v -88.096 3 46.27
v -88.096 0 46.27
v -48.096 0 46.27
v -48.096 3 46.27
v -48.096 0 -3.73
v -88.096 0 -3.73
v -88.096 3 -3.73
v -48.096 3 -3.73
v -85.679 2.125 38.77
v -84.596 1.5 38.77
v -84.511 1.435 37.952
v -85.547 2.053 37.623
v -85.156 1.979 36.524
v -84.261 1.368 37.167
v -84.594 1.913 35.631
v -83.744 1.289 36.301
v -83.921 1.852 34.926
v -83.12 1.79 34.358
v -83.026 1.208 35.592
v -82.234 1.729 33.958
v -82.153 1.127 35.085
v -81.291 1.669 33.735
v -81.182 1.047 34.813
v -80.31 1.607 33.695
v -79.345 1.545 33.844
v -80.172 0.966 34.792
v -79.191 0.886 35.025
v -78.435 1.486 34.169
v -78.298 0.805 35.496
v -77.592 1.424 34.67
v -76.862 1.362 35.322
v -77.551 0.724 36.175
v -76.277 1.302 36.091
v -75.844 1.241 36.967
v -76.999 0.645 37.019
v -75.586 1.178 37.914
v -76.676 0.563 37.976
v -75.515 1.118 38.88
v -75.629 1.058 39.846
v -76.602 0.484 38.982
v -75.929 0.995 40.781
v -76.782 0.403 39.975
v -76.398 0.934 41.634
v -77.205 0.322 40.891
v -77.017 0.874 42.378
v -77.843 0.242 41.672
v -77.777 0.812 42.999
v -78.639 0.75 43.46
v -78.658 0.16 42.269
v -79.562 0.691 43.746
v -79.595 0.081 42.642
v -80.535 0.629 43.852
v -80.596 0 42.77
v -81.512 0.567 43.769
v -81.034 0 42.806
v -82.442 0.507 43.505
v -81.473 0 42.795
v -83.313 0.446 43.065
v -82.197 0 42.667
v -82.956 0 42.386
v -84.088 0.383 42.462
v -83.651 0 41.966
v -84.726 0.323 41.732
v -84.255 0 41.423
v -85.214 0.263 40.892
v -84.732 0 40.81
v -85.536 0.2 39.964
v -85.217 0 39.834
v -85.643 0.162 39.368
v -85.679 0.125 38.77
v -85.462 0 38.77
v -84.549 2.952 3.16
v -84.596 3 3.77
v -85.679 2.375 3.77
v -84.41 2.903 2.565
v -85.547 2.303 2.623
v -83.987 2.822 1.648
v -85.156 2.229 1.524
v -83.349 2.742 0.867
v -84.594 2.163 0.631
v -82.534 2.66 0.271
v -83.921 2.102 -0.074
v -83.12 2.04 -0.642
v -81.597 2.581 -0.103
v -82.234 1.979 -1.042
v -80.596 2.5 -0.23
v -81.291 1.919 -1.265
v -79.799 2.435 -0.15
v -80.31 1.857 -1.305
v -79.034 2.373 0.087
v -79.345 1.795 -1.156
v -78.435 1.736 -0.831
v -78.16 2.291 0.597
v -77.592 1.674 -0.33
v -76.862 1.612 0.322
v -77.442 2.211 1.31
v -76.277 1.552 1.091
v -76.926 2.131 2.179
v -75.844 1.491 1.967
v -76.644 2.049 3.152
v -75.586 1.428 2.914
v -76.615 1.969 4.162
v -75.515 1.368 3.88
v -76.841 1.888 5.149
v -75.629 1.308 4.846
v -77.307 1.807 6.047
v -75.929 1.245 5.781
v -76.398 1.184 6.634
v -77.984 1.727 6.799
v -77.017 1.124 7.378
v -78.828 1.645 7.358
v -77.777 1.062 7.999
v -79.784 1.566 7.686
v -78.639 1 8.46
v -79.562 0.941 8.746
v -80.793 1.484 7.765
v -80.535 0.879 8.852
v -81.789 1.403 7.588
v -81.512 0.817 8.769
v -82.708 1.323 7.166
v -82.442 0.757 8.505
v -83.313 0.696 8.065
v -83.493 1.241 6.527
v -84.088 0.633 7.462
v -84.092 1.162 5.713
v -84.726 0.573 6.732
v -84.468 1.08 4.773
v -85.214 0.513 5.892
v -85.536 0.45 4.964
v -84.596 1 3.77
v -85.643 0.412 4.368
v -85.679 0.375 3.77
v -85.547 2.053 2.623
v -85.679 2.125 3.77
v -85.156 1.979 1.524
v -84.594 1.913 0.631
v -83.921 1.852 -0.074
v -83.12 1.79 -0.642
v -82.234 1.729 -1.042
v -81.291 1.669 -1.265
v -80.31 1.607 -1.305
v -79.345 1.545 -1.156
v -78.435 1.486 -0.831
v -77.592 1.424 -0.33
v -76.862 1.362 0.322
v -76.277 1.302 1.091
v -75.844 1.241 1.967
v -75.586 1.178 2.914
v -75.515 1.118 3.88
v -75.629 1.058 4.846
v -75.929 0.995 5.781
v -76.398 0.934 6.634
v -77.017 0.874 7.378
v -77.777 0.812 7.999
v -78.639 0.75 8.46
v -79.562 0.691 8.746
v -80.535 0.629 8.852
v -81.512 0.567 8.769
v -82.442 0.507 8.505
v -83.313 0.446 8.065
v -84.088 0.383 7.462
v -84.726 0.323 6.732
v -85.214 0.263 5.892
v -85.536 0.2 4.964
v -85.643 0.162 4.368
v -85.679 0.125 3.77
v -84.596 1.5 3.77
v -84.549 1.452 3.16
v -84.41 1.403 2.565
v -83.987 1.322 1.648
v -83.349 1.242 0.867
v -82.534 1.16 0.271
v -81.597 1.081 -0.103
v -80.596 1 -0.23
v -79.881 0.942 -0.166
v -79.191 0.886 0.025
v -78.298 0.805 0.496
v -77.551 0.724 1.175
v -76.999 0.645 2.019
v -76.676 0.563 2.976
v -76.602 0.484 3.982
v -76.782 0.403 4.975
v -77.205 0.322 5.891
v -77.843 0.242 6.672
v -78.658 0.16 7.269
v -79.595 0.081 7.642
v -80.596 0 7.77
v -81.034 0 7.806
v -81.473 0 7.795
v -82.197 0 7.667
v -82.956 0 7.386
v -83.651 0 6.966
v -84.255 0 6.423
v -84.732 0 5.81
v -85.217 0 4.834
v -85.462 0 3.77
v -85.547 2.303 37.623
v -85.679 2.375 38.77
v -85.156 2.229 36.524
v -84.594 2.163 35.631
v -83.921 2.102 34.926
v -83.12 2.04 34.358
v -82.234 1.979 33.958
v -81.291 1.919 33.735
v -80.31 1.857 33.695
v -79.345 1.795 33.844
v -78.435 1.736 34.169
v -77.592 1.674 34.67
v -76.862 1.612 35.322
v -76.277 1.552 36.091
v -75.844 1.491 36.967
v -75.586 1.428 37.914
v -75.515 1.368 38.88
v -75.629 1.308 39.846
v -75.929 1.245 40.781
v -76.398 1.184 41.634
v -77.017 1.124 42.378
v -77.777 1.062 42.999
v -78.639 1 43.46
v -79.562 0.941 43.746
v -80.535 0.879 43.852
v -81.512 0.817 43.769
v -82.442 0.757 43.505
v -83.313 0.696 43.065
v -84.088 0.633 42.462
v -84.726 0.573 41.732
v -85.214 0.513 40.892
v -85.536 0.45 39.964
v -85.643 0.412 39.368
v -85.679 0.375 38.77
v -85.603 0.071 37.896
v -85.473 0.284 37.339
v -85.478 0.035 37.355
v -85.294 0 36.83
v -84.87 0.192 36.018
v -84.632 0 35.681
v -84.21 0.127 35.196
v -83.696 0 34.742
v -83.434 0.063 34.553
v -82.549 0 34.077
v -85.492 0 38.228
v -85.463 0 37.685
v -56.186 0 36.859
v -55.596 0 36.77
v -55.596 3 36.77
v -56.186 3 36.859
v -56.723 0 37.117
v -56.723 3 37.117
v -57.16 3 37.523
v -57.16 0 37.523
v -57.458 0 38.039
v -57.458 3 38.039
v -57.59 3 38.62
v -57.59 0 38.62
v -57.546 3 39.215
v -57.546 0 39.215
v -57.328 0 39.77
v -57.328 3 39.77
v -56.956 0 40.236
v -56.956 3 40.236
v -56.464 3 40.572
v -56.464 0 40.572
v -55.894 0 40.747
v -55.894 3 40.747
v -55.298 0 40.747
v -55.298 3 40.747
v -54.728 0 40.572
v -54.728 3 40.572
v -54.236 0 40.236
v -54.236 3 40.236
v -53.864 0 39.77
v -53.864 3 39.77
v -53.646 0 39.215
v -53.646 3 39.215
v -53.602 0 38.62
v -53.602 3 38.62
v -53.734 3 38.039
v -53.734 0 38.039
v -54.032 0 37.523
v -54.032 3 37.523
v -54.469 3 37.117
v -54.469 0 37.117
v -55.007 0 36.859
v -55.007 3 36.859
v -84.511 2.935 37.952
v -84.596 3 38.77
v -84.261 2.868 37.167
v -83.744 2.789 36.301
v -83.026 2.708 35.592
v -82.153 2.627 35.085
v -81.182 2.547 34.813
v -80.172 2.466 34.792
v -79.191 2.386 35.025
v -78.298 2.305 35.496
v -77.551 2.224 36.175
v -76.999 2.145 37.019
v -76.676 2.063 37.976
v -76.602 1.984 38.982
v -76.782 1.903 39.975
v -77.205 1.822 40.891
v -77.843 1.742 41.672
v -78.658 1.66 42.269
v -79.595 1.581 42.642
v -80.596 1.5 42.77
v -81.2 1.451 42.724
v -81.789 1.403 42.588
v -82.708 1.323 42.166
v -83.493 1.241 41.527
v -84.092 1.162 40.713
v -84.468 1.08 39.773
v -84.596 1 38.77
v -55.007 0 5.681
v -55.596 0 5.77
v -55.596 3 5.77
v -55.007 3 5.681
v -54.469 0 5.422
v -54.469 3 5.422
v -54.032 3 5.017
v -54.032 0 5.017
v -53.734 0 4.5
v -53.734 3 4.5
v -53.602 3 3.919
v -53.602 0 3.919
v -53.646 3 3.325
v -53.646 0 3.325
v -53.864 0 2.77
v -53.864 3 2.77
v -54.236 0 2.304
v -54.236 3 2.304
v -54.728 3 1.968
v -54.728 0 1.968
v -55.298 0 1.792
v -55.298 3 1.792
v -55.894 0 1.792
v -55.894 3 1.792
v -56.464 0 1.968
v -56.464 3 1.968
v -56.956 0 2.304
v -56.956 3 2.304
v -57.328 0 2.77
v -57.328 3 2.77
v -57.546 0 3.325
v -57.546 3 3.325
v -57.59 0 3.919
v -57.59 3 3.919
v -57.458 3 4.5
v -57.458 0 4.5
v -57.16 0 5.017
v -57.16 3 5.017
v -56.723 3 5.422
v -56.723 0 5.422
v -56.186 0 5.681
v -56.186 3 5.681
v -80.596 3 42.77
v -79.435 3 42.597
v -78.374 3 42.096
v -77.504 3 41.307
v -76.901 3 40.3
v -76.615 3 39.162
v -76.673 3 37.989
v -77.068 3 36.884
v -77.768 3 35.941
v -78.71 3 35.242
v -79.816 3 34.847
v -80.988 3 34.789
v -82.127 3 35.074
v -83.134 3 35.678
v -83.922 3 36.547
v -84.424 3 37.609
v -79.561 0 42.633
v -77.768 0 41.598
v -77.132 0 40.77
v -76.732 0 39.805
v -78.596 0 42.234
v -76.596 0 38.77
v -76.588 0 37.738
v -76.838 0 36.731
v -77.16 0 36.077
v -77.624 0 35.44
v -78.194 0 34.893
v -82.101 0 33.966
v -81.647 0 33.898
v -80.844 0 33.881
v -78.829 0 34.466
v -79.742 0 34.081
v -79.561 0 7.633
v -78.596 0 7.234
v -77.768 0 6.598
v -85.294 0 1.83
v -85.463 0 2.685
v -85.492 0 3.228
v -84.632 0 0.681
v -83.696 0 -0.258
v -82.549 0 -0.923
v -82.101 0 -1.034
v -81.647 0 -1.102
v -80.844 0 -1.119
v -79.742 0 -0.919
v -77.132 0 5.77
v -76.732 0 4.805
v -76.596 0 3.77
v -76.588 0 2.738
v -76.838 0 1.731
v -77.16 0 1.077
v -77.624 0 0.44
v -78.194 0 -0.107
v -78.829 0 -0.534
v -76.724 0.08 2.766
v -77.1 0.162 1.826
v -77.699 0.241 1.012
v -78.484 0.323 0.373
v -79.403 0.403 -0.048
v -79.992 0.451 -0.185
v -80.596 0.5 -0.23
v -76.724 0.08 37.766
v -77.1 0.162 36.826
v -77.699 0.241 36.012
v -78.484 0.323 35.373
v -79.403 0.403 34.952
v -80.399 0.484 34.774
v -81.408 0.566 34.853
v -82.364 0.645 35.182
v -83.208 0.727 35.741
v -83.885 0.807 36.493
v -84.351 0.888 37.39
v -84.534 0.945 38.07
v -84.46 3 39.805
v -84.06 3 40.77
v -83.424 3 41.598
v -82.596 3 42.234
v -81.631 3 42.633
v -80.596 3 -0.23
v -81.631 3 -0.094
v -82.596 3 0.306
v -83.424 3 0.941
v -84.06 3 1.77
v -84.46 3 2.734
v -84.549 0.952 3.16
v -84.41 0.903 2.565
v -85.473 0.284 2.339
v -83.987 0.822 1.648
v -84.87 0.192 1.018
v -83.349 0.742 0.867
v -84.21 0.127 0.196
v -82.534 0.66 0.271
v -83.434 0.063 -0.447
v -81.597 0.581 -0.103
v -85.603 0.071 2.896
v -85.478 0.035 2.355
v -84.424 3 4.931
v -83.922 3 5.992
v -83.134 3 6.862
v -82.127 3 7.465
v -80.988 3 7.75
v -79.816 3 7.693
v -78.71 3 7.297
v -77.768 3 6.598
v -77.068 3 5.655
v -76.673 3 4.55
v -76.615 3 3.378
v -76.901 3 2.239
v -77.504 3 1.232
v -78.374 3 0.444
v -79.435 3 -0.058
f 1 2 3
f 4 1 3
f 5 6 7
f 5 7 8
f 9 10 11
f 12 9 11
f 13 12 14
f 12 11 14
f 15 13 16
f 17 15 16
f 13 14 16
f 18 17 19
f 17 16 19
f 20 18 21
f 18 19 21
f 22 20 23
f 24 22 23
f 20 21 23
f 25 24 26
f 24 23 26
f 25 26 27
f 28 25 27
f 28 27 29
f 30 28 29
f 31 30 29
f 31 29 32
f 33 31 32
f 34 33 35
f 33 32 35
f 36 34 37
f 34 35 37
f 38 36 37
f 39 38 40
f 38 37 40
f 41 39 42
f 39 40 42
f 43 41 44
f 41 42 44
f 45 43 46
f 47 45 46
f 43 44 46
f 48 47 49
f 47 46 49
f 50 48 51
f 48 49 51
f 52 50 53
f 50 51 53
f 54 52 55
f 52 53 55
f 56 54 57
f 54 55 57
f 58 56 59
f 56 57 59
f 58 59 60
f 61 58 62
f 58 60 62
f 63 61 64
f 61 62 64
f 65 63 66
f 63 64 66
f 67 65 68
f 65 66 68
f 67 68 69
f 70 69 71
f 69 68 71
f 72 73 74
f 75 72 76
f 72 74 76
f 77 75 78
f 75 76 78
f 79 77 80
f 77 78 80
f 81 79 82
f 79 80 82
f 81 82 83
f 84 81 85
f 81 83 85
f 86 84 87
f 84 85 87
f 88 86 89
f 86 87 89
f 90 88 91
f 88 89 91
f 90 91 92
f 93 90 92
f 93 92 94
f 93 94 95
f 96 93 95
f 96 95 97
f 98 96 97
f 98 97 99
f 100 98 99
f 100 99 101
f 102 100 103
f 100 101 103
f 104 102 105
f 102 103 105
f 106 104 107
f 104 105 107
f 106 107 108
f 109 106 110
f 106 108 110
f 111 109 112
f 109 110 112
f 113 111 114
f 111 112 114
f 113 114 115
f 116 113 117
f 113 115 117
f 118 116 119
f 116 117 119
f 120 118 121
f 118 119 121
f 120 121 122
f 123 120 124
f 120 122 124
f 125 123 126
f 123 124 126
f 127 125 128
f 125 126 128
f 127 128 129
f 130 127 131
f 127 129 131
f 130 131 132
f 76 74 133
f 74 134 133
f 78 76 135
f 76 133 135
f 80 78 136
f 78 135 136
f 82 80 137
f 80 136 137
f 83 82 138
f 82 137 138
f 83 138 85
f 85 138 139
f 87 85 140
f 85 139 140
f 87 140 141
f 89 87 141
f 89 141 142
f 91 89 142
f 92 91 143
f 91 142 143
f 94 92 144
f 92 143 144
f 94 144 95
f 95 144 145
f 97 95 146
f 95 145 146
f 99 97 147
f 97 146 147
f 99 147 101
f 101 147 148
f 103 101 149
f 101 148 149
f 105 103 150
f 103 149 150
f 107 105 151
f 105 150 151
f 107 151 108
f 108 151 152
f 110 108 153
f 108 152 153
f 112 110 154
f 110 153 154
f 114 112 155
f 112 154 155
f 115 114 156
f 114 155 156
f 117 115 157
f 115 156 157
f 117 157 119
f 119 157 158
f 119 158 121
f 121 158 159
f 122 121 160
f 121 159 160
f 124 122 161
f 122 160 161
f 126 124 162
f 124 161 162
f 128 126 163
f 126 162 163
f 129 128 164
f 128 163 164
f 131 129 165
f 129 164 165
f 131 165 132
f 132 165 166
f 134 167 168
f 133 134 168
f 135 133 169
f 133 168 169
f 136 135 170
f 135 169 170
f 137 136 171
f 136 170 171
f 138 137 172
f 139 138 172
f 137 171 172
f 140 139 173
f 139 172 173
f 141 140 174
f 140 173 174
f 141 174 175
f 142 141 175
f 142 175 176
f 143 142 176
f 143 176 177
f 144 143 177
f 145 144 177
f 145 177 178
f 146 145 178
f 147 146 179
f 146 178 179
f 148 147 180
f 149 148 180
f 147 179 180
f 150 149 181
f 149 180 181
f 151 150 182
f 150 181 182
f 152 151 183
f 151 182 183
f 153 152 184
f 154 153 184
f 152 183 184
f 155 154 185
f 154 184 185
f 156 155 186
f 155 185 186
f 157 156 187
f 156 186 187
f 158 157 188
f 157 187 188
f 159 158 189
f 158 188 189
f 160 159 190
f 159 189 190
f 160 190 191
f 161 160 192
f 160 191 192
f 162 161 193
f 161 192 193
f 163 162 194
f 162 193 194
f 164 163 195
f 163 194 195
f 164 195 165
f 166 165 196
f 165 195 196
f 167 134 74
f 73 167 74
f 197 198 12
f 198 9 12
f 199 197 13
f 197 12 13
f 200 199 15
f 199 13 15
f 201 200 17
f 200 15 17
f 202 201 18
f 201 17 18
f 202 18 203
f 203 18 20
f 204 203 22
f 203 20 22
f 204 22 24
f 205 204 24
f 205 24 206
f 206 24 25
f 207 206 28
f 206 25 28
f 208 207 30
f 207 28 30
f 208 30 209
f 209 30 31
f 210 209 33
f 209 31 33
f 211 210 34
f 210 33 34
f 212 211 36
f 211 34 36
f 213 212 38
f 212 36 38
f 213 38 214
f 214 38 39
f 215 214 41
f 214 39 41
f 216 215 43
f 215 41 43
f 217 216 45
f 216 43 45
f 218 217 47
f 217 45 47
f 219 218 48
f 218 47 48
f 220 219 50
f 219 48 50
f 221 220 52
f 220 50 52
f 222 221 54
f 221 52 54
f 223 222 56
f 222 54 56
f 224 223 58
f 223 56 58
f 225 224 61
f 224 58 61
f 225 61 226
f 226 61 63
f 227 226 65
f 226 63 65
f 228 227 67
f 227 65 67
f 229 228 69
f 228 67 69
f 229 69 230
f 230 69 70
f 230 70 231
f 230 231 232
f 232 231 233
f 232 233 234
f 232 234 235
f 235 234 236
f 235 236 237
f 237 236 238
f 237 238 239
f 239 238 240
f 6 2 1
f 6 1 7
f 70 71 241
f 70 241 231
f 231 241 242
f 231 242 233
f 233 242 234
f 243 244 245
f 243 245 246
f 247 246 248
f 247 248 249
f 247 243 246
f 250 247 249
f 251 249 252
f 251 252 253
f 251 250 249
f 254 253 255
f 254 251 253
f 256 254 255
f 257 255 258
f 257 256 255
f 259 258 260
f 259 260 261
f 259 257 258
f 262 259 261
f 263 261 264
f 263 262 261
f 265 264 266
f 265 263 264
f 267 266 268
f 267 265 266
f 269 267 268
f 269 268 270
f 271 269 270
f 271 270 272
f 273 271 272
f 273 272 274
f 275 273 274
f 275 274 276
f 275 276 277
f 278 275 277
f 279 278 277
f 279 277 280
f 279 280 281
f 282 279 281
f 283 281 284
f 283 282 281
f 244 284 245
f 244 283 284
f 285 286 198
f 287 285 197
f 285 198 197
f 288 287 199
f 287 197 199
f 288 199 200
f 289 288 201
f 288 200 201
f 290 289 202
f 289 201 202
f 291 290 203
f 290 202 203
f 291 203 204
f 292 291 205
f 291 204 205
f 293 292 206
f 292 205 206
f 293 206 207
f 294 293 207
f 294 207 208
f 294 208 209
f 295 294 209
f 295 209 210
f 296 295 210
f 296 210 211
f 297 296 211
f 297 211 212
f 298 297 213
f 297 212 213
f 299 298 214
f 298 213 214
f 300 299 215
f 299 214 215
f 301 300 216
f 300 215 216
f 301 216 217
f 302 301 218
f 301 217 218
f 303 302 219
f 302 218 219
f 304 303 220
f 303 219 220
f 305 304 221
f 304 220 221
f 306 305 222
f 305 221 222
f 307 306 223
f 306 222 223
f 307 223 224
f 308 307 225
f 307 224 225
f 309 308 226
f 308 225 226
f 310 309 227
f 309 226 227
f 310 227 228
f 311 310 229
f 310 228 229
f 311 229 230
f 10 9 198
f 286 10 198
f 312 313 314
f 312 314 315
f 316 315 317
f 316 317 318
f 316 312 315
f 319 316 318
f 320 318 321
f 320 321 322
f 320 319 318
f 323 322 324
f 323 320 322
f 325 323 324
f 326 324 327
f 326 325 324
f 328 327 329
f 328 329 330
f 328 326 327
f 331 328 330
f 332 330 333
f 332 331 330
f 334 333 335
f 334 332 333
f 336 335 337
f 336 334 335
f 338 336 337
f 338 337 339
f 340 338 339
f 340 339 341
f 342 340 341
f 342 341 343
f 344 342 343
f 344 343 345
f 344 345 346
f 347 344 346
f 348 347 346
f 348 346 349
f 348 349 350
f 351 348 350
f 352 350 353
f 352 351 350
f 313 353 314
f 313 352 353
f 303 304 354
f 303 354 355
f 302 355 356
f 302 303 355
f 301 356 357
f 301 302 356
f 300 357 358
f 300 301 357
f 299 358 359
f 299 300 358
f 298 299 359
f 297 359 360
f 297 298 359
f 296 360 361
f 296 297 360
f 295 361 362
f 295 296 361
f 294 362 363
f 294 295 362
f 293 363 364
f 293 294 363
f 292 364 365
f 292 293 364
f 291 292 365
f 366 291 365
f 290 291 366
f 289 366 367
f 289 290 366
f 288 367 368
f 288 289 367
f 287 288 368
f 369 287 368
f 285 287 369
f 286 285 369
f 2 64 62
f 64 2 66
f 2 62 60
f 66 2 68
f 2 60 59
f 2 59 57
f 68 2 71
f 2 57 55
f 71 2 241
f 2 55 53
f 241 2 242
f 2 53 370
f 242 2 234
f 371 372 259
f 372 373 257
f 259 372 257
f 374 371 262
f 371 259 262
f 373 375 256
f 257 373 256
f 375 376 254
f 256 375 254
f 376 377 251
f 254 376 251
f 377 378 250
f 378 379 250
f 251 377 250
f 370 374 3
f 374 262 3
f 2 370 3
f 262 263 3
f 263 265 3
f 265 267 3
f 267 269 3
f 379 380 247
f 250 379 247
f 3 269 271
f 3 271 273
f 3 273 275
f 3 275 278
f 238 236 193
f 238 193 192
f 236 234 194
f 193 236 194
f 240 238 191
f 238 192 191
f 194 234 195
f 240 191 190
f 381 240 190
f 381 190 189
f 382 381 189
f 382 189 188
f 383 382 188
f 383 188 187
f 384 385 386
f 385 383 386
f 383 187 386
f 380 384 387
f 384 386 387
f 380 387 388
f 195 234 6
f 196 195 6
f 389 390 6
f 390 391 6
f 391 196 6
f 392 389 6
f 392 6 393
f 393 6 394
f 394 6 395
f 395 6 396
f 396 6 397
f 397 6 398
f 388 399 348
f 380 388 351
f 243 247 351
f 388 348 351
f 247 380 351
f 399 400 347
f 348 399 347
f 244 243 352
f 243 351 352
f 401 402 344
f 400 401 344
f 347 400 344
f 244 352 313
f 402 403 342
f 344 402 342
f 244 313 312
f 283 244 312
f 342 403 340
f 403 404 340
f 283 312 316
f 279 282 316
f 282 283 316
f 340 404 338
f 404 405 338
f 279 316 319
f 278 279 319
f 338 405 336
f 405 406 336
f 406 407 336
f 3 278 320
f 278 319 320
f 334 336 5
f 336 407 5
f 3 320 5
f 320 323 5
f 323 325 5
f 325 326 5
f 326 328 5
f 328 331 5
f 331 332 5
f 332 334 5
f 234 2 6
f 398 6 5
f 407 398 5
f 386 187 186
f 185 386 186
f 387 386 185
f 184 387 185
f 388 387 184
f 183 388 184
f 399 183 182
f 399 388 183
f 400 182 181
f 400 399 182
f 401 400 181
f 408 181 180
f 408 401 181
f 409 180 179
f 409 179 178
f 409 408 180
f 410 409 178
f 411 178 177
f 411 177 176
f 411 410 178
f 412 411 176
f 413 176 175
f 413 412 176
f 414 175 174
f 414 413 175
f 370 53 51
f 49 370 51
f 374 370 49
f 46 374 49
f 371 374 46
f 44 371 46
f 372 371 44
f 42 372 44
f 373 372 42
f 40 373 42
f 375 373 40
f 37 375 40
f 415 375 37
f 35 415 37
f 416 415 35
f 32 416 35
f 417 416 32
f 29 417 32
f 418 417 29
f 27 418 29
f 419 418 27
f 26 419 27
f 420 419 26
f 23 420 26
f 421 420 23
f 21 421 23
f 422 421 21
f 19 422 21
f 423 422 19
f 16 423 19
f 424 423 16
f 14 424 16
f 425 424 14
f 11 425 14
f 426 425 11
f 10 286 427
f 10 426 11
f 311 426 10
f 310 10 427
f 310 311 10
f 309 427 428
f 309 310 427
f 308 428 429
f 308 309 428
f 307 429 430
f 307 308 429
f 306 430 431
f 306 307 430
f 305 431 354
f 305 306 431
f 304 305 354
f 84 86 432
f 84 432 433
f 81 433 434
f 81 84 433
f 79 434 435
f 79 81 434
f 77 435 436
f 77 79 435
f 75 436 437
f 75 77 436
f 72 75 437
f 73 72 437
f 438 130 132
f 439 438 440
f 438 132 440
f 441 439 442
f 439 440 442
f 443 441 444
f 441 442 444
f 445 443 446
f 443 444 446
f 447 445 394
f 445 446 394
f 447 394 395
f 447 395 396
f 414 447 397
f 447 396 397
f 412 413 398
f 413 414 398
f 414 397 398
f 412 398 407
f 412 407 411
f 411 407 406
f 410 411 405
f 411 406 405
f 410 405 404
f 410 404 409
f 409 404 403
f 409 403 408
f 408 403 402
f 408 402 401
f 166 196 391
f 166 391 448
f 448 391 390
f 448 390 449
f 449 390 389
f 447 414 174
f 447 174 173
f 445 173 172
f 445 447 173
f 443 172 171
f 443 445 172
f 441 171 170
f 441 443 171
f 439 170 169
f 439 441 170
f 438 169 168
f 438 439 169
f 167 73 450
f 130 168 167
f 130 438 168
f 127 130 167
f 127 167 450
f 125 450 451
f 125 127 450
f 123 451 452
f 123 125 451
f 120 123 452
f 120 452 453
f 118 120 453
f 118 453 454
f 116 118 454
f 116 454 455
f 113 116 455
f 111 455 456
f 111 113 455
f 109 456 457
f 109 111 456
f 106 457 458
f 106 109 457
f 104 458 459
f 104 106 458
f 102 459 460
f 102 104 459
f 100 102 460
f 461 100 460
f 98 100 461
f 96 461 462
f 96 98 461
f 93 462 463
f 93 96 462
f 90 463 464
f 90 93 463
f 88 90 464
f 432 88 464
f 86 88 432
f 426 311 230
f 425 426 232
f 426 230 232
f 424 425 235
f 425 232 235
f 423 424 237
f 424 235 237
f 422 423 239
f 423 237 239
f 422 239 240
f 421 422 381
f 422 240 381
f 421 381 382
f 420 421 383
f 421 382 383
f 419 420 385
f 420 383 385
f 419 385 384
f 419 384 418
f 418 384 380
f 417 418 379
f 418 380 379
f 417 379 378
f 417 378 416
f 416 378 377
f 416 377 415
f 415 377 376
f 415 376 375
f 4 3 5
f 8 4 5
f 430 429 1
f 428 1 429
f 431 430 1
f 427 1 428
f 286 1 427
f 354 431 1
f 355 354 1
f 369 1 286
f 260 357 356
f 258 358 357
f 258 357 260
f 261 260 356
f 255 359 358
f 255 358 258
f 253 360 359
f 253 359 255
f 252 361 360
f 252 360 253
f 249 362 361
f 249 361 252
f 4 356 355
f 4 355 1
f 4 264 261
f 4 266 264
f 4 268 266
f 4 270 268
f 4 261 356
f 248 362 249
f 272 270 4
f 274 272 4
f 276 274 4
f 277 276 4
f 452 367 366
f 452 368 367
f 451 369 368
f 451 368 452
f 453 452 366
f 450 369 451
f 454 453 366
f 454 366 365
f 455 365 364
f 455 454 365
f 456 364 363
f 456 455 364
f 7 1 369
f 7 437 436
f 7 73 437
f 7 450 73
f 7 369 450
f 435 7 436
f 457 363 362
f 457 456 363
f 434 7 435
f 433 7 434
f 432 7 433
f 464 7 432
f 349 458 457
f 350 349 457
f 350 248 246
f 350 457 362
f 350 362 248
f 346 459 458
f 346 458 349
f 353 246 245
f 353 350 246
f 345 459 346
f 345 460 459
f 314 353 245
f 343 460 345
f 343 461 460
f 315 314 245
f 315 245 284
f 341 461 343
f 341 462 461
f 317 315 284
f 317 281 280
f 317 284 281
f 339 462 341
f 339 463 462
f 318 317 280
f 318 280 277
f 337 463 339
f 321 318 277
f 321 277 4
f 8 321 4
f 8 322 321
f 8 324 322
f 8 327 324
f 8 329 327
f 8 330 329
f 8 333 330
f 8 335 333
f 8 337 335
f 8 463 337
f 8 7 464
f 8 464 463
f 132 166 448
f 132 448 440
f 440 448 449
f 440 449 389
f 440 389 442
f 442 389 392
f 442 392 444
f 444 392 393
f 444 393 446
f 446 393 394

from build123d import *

# Parameters (mm, degrees)
SKETCH1_W           = 40
SKETCH1_H           = 50
SKETCH1_R           = 2
SKETCH1_R_2         = 4
BOSS_EXTRUDE1_DEPTH = 3
THREAD1_PITCH       = 2
THREAD2_PITCH       = 2


with BuildPart() as part:
    # Sketch1 → Boss-Extrude1 (new body)
    with BuildSketch(Plane(origin=(0, 0, 0), x_dir=(1, 0, 0), z_dir=(0, 1, 0))):
        with Locations((-68.096050638, -21.269649337)):
            Rectangle(SKETCH1_W, SKETCH1_H)
        with Locations(Location((-55.596050638, -3.769649337, 0), (0, 0, 270))):
            Circle(SKETCH1_R, mode=Mode.SUBTRACT)
        with Locations(Location((-55.596050638, -38.769649337, 0), (0, 0, 90))):
            Circle(SKETCH1_R, mode=Mode.SUBTRACT)
        with Locations(Location((-80.596050638, -38.769649337, 0), (0, 0, 270))):
            Circle(SKETCH1_R_2, mode=Mode.SUBTRACT)
        with Locations(Location((-80.596050638, -3.769649337, 0), (0, 0, 90))):
            Circle(SKETCH1_R_2, mode=Mode.SUBTRACT)
    extrude(amount=BOSS_EXTRUDE1_DEPTH)

    # Thread1: the profile of Thread Profile1 profile screwed along a right-hand helix of 1.5 turns, 10 arcs to a turn; built about Z, then put on its axis
    thread1_z = Axis((0, 0, 0), (0, 0, 1))
    thread1_corners = [(3.9997, 0, -0.000173205), (5.08253175, 0, 0.624999997), (5.08253175, 0, 0.874999997), (3.9997, 0, 1.5001732)]
    with BuildLine(mode=Mode.PRIVATE) as thread1_profile:
        Line(thread1_corners[0], thread1_corners[1])
        Line(thread1_corners[1], thread1_corners[2])
        Line(thread1_corners[2], thread1_corners[3])
        Line(thread1_corners[3], thread1_corners[0])
    thread1_cap = Face(thread1_profile.wire())
    thread1_turn_angles = [0, 18, 36, 54, 72, 90, 108, 126, 144, 162, 180, 198, 216, 234, 252, 270, 288, 306, 324, 342, 360]
    thread1_turn_weights = [1, 0.9510565162951535, 1, 0.9510565162951535, 1, 0.9510565162951535, 1, 0.9510565162951535, 1, 0.9510565162951535, 1, 0.9510565162951535, 1, 0.9510565162951535, 1, 0.9510565162951535, 1, 0.9510565162951535, 1, 0.9510565162951535, 1]
    thread1_turn_rails = [Edge.make_bspline([Vector(p[0], p[1], 0).rotate(thread1_z, thread1_turn_angles[k]) / thread1_turn_weights[k] + Vector(0, 0, p[2] + THREAD1_PITCH * thread1_turn_angles[k] / 360) for k in range(21)], [0, 0, 0, 1, 1, 2, 2, 3, 3, 4, 4, 5, 5, 6, 6, 7, 7, 8, 8, 9, 9, 10, 10, 10], 2, thread1_turn_weights) for p in thread1_corners]
    thread1_turn_sides = [Face.make_surface_from_curves(thread1_turn_rails[p[0]], thread1_turn_rails[p[1]]) for p in [(0, 1), (1, 2), (2, 3), (3, 0)]]
    thread1_last_angles = [360, 378, 396, 414, 432, 450, 468, 486, 504, 522, 540]
    thread1_last_weights = [1, 0.9510565162951535, 1, 0.9510565162951535, 1, 0.9510565162951535, 1, 0.9510565162951535, 1, 0.9510565162951535, 1]
    thread1_last_rails = [Edge.make_bspline([Vector(p[0], p[1], 0).rotate(thread1_z, thread1_last_angles[k]) / thread1_last_weights[k] + Vector(0, 0, p[2] + THREAD1_PITCH * thread1_last_angles[k] / 360) for k in range(11)], [0, 0, 0, 1, 1, 2, 2, 3, 3, 4, 4, 5, 5, 5], 2, thread1_last_weights) for p in thread1_corners]
    thread1_last_sides = [Face.make_surface_from_curves(thread1_last_rails[p[0]], thread1_last_rails[p[1]]) for p in [(0, 1), (1, 2), (2, 3), (3, 0)]]
    thread1 = Plane(origin=(-80.596050638, 3, 3.769649337), x_dir=(-1, 0, 0), z_dir=(0, -1, 0)) * Solid(Shell([*thread1_turn_sides, *thread1_last_sides, thread1_cap, thread1_cap.rotate(thread1_z, 540).moved(Location((0, 0, THREAD1_PITCH * 540 / 360)))]))
    add(thread1, mode=Mode.SUBTRACT)

    # Thread2: the profile of Thread Profile2 profile screwed along a right-hand helix of 1.5 turns, 10 arcs to a turn; built about Z, then put on its axis
    thread2_z = Axis((0, 0, 0), (0, 0, 1))
    thread2_corners = [(3.9997, 0, -0.000173205), (5.08253175, 0, 0.624999997), (5.08253175, 0, 0.874999997), (3.9997, 0, 1.5001732)]
    with BuildLine(mode=Mode.PRIVATE) as thread2_profile:
        Line(thread2_corners[0], thread2_corners[1])
        Line(thread2_corners[1], thread2_corners[2])
        Line(thread2_corners[2], thread2_corners[3])
        Line(thread2_corners[3], thread2_corners[0])
    thread2_cap = Face(thread2_profile.wire())
    thread2_turn_angles = [0, 18, 36, 54, 72, 90, 108, 126, 144, 162, 180, 198, 216, 234, 252, 270, 288, 306, 324, 342, 360]
    thread2_turn_weights = [1, 0.9510565162951535, 1, 0.9510565162951535, 1, 0.9510565162951535, 1, 0.9510565162951535, 1, 0.9510565162951535, 1, 0.9510565162951535, 1, 0.9510565162951535, 1, 0.9510565162951535, 1, 0.9510565162951535, 1, 0.9510565162951535, 1]
    thread2_turn_rails = [Edge.make_bspline([Vector(p[0], p[1], 0).rotate(thread2_z, thread2_turn_angles[k]) / thread2_turn_weights[k] + Vector(0, 0, p[2] + THREAD2_PITCH * thread2_turn_angles[k] / 360) for k in range(21)], [0, 0, 0, 1, 1, 2, 2, 3, 3, 4, 4, 5, 5, 6, 6, 7, 7, 8, 8, 9, 9, 10, 10, 10], 2, thread2_turn_weights) for p in thread2_corners]
    thread2_turn_sides = [Face.make_surface_from_curves(thread2_turn_rails[p[0]], thread2_turn_rails[p[1]]) for p in [(0, 1), (1, 2), (2, 3), (3, 0)]]
    thread2_last_angles = [360, 378, 396, 414, 432, 450, 468, 486, 504, 522, 540]
    thread2_last_weights = [1, 0.9510565162951535, 1, 0.9510565162951535, 1, 0.9510565162951535, 1, 0.9510565162951535, 1, 0.9510565162951535, 1]
    thread2_last_rails = [Edge.make_bspline([Vector(p[0], p[1], 0).rotate(thread2_z, thread2_last_angles[k]) / thread2_last_weights[k] + Vector(0, 0, p[2] + THREAD2_PITCH * thread2_last_angles[k] / 360) for k in range(11)], [0, 0, 0, 1, 1, 2, 2, 3, 3, 4, 4, 5, 5, 5], 2, thread2_last_weights) for p in thread2_corners]
    thread2_last_sides = [Face.make_surface_from_curves(thread2_last_rails[p[0]], thread2_last_rails[p[1]]) for p in [(0, 1), (1, 2), (2, 3), (3, 0)]]
    thread2 = Plane(origin=(-80.596050638, 3, 38.769649337), x_dir=(-1, 0, 0), z_dir=(0, -1, 0)) * Solid(Shell([*thread2_turn_sides, *thread2_last_sides, thread2_cap, thread2_cap.rotate(thread2_z, 540).moved(Location((0, 0, THREAD2_PITCH * 540 / 360)))]))
    add(thread2, mode=Mode.SUBTRACT)


solid = part.part
